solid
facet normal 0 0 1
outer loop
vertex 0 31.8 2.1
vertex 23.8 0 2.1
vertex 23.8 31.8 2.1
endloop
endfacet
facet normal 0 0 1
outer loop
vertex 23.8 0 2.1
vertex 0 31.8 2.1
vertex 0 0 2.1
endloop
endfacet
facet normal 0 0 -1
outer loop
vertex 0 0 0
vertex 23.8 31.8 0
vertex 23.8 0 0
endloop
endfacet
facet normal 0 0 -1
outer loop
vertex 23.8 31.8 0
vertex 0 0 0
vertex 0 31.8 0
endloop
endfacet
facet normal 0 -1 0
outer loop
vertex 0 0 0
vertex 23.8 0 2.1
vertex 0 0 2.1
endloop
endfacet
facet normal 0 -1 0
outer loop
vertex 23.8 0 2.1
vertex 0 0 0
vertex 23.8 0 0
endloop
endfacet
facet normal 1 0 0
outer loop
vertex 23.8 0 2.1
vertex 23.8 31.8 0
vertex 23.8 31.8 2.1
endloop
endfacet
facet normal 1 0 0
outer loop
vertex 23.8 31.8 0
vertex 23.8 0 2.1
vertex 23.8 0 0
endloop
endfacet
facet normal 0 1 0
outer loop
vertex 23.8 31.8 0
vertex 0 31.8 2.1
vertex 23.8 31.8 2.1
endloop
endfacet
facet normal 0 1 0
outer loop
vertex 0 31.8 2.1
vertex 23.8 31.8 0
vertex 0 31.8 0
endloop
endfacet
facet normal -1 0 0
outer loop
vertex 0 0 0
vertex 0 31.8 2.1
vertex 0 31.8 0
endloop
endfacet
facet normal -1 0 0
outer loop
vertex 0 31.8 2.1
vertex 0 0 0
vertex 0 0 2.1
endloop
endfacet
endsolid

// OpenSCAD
$fn = 42;

cube(size = [23.8000000000, 31.8000000000, 2.1000000000]);
/***********************************************
*********      SolidPython code:      **********
************************************************
 
from os.path import join
from solid.utils import *

SEGMENTS = 42
NAME = "sd_card.scad"


class SDCard:
    width = 23.8
    length = 31.8
    height = 2.1

    def __init__(self):
        pass

    def assemble(self):
        return cube([self.width, self.length, self.height])


if __name__ == '__main__':
    sd_card = SDCard()
    scad_render_to_file(sd_card.assemble(), join('./out/', NAME), file_header='$fn = %s;' % SEGMENTS)
 
 
************************************************/
